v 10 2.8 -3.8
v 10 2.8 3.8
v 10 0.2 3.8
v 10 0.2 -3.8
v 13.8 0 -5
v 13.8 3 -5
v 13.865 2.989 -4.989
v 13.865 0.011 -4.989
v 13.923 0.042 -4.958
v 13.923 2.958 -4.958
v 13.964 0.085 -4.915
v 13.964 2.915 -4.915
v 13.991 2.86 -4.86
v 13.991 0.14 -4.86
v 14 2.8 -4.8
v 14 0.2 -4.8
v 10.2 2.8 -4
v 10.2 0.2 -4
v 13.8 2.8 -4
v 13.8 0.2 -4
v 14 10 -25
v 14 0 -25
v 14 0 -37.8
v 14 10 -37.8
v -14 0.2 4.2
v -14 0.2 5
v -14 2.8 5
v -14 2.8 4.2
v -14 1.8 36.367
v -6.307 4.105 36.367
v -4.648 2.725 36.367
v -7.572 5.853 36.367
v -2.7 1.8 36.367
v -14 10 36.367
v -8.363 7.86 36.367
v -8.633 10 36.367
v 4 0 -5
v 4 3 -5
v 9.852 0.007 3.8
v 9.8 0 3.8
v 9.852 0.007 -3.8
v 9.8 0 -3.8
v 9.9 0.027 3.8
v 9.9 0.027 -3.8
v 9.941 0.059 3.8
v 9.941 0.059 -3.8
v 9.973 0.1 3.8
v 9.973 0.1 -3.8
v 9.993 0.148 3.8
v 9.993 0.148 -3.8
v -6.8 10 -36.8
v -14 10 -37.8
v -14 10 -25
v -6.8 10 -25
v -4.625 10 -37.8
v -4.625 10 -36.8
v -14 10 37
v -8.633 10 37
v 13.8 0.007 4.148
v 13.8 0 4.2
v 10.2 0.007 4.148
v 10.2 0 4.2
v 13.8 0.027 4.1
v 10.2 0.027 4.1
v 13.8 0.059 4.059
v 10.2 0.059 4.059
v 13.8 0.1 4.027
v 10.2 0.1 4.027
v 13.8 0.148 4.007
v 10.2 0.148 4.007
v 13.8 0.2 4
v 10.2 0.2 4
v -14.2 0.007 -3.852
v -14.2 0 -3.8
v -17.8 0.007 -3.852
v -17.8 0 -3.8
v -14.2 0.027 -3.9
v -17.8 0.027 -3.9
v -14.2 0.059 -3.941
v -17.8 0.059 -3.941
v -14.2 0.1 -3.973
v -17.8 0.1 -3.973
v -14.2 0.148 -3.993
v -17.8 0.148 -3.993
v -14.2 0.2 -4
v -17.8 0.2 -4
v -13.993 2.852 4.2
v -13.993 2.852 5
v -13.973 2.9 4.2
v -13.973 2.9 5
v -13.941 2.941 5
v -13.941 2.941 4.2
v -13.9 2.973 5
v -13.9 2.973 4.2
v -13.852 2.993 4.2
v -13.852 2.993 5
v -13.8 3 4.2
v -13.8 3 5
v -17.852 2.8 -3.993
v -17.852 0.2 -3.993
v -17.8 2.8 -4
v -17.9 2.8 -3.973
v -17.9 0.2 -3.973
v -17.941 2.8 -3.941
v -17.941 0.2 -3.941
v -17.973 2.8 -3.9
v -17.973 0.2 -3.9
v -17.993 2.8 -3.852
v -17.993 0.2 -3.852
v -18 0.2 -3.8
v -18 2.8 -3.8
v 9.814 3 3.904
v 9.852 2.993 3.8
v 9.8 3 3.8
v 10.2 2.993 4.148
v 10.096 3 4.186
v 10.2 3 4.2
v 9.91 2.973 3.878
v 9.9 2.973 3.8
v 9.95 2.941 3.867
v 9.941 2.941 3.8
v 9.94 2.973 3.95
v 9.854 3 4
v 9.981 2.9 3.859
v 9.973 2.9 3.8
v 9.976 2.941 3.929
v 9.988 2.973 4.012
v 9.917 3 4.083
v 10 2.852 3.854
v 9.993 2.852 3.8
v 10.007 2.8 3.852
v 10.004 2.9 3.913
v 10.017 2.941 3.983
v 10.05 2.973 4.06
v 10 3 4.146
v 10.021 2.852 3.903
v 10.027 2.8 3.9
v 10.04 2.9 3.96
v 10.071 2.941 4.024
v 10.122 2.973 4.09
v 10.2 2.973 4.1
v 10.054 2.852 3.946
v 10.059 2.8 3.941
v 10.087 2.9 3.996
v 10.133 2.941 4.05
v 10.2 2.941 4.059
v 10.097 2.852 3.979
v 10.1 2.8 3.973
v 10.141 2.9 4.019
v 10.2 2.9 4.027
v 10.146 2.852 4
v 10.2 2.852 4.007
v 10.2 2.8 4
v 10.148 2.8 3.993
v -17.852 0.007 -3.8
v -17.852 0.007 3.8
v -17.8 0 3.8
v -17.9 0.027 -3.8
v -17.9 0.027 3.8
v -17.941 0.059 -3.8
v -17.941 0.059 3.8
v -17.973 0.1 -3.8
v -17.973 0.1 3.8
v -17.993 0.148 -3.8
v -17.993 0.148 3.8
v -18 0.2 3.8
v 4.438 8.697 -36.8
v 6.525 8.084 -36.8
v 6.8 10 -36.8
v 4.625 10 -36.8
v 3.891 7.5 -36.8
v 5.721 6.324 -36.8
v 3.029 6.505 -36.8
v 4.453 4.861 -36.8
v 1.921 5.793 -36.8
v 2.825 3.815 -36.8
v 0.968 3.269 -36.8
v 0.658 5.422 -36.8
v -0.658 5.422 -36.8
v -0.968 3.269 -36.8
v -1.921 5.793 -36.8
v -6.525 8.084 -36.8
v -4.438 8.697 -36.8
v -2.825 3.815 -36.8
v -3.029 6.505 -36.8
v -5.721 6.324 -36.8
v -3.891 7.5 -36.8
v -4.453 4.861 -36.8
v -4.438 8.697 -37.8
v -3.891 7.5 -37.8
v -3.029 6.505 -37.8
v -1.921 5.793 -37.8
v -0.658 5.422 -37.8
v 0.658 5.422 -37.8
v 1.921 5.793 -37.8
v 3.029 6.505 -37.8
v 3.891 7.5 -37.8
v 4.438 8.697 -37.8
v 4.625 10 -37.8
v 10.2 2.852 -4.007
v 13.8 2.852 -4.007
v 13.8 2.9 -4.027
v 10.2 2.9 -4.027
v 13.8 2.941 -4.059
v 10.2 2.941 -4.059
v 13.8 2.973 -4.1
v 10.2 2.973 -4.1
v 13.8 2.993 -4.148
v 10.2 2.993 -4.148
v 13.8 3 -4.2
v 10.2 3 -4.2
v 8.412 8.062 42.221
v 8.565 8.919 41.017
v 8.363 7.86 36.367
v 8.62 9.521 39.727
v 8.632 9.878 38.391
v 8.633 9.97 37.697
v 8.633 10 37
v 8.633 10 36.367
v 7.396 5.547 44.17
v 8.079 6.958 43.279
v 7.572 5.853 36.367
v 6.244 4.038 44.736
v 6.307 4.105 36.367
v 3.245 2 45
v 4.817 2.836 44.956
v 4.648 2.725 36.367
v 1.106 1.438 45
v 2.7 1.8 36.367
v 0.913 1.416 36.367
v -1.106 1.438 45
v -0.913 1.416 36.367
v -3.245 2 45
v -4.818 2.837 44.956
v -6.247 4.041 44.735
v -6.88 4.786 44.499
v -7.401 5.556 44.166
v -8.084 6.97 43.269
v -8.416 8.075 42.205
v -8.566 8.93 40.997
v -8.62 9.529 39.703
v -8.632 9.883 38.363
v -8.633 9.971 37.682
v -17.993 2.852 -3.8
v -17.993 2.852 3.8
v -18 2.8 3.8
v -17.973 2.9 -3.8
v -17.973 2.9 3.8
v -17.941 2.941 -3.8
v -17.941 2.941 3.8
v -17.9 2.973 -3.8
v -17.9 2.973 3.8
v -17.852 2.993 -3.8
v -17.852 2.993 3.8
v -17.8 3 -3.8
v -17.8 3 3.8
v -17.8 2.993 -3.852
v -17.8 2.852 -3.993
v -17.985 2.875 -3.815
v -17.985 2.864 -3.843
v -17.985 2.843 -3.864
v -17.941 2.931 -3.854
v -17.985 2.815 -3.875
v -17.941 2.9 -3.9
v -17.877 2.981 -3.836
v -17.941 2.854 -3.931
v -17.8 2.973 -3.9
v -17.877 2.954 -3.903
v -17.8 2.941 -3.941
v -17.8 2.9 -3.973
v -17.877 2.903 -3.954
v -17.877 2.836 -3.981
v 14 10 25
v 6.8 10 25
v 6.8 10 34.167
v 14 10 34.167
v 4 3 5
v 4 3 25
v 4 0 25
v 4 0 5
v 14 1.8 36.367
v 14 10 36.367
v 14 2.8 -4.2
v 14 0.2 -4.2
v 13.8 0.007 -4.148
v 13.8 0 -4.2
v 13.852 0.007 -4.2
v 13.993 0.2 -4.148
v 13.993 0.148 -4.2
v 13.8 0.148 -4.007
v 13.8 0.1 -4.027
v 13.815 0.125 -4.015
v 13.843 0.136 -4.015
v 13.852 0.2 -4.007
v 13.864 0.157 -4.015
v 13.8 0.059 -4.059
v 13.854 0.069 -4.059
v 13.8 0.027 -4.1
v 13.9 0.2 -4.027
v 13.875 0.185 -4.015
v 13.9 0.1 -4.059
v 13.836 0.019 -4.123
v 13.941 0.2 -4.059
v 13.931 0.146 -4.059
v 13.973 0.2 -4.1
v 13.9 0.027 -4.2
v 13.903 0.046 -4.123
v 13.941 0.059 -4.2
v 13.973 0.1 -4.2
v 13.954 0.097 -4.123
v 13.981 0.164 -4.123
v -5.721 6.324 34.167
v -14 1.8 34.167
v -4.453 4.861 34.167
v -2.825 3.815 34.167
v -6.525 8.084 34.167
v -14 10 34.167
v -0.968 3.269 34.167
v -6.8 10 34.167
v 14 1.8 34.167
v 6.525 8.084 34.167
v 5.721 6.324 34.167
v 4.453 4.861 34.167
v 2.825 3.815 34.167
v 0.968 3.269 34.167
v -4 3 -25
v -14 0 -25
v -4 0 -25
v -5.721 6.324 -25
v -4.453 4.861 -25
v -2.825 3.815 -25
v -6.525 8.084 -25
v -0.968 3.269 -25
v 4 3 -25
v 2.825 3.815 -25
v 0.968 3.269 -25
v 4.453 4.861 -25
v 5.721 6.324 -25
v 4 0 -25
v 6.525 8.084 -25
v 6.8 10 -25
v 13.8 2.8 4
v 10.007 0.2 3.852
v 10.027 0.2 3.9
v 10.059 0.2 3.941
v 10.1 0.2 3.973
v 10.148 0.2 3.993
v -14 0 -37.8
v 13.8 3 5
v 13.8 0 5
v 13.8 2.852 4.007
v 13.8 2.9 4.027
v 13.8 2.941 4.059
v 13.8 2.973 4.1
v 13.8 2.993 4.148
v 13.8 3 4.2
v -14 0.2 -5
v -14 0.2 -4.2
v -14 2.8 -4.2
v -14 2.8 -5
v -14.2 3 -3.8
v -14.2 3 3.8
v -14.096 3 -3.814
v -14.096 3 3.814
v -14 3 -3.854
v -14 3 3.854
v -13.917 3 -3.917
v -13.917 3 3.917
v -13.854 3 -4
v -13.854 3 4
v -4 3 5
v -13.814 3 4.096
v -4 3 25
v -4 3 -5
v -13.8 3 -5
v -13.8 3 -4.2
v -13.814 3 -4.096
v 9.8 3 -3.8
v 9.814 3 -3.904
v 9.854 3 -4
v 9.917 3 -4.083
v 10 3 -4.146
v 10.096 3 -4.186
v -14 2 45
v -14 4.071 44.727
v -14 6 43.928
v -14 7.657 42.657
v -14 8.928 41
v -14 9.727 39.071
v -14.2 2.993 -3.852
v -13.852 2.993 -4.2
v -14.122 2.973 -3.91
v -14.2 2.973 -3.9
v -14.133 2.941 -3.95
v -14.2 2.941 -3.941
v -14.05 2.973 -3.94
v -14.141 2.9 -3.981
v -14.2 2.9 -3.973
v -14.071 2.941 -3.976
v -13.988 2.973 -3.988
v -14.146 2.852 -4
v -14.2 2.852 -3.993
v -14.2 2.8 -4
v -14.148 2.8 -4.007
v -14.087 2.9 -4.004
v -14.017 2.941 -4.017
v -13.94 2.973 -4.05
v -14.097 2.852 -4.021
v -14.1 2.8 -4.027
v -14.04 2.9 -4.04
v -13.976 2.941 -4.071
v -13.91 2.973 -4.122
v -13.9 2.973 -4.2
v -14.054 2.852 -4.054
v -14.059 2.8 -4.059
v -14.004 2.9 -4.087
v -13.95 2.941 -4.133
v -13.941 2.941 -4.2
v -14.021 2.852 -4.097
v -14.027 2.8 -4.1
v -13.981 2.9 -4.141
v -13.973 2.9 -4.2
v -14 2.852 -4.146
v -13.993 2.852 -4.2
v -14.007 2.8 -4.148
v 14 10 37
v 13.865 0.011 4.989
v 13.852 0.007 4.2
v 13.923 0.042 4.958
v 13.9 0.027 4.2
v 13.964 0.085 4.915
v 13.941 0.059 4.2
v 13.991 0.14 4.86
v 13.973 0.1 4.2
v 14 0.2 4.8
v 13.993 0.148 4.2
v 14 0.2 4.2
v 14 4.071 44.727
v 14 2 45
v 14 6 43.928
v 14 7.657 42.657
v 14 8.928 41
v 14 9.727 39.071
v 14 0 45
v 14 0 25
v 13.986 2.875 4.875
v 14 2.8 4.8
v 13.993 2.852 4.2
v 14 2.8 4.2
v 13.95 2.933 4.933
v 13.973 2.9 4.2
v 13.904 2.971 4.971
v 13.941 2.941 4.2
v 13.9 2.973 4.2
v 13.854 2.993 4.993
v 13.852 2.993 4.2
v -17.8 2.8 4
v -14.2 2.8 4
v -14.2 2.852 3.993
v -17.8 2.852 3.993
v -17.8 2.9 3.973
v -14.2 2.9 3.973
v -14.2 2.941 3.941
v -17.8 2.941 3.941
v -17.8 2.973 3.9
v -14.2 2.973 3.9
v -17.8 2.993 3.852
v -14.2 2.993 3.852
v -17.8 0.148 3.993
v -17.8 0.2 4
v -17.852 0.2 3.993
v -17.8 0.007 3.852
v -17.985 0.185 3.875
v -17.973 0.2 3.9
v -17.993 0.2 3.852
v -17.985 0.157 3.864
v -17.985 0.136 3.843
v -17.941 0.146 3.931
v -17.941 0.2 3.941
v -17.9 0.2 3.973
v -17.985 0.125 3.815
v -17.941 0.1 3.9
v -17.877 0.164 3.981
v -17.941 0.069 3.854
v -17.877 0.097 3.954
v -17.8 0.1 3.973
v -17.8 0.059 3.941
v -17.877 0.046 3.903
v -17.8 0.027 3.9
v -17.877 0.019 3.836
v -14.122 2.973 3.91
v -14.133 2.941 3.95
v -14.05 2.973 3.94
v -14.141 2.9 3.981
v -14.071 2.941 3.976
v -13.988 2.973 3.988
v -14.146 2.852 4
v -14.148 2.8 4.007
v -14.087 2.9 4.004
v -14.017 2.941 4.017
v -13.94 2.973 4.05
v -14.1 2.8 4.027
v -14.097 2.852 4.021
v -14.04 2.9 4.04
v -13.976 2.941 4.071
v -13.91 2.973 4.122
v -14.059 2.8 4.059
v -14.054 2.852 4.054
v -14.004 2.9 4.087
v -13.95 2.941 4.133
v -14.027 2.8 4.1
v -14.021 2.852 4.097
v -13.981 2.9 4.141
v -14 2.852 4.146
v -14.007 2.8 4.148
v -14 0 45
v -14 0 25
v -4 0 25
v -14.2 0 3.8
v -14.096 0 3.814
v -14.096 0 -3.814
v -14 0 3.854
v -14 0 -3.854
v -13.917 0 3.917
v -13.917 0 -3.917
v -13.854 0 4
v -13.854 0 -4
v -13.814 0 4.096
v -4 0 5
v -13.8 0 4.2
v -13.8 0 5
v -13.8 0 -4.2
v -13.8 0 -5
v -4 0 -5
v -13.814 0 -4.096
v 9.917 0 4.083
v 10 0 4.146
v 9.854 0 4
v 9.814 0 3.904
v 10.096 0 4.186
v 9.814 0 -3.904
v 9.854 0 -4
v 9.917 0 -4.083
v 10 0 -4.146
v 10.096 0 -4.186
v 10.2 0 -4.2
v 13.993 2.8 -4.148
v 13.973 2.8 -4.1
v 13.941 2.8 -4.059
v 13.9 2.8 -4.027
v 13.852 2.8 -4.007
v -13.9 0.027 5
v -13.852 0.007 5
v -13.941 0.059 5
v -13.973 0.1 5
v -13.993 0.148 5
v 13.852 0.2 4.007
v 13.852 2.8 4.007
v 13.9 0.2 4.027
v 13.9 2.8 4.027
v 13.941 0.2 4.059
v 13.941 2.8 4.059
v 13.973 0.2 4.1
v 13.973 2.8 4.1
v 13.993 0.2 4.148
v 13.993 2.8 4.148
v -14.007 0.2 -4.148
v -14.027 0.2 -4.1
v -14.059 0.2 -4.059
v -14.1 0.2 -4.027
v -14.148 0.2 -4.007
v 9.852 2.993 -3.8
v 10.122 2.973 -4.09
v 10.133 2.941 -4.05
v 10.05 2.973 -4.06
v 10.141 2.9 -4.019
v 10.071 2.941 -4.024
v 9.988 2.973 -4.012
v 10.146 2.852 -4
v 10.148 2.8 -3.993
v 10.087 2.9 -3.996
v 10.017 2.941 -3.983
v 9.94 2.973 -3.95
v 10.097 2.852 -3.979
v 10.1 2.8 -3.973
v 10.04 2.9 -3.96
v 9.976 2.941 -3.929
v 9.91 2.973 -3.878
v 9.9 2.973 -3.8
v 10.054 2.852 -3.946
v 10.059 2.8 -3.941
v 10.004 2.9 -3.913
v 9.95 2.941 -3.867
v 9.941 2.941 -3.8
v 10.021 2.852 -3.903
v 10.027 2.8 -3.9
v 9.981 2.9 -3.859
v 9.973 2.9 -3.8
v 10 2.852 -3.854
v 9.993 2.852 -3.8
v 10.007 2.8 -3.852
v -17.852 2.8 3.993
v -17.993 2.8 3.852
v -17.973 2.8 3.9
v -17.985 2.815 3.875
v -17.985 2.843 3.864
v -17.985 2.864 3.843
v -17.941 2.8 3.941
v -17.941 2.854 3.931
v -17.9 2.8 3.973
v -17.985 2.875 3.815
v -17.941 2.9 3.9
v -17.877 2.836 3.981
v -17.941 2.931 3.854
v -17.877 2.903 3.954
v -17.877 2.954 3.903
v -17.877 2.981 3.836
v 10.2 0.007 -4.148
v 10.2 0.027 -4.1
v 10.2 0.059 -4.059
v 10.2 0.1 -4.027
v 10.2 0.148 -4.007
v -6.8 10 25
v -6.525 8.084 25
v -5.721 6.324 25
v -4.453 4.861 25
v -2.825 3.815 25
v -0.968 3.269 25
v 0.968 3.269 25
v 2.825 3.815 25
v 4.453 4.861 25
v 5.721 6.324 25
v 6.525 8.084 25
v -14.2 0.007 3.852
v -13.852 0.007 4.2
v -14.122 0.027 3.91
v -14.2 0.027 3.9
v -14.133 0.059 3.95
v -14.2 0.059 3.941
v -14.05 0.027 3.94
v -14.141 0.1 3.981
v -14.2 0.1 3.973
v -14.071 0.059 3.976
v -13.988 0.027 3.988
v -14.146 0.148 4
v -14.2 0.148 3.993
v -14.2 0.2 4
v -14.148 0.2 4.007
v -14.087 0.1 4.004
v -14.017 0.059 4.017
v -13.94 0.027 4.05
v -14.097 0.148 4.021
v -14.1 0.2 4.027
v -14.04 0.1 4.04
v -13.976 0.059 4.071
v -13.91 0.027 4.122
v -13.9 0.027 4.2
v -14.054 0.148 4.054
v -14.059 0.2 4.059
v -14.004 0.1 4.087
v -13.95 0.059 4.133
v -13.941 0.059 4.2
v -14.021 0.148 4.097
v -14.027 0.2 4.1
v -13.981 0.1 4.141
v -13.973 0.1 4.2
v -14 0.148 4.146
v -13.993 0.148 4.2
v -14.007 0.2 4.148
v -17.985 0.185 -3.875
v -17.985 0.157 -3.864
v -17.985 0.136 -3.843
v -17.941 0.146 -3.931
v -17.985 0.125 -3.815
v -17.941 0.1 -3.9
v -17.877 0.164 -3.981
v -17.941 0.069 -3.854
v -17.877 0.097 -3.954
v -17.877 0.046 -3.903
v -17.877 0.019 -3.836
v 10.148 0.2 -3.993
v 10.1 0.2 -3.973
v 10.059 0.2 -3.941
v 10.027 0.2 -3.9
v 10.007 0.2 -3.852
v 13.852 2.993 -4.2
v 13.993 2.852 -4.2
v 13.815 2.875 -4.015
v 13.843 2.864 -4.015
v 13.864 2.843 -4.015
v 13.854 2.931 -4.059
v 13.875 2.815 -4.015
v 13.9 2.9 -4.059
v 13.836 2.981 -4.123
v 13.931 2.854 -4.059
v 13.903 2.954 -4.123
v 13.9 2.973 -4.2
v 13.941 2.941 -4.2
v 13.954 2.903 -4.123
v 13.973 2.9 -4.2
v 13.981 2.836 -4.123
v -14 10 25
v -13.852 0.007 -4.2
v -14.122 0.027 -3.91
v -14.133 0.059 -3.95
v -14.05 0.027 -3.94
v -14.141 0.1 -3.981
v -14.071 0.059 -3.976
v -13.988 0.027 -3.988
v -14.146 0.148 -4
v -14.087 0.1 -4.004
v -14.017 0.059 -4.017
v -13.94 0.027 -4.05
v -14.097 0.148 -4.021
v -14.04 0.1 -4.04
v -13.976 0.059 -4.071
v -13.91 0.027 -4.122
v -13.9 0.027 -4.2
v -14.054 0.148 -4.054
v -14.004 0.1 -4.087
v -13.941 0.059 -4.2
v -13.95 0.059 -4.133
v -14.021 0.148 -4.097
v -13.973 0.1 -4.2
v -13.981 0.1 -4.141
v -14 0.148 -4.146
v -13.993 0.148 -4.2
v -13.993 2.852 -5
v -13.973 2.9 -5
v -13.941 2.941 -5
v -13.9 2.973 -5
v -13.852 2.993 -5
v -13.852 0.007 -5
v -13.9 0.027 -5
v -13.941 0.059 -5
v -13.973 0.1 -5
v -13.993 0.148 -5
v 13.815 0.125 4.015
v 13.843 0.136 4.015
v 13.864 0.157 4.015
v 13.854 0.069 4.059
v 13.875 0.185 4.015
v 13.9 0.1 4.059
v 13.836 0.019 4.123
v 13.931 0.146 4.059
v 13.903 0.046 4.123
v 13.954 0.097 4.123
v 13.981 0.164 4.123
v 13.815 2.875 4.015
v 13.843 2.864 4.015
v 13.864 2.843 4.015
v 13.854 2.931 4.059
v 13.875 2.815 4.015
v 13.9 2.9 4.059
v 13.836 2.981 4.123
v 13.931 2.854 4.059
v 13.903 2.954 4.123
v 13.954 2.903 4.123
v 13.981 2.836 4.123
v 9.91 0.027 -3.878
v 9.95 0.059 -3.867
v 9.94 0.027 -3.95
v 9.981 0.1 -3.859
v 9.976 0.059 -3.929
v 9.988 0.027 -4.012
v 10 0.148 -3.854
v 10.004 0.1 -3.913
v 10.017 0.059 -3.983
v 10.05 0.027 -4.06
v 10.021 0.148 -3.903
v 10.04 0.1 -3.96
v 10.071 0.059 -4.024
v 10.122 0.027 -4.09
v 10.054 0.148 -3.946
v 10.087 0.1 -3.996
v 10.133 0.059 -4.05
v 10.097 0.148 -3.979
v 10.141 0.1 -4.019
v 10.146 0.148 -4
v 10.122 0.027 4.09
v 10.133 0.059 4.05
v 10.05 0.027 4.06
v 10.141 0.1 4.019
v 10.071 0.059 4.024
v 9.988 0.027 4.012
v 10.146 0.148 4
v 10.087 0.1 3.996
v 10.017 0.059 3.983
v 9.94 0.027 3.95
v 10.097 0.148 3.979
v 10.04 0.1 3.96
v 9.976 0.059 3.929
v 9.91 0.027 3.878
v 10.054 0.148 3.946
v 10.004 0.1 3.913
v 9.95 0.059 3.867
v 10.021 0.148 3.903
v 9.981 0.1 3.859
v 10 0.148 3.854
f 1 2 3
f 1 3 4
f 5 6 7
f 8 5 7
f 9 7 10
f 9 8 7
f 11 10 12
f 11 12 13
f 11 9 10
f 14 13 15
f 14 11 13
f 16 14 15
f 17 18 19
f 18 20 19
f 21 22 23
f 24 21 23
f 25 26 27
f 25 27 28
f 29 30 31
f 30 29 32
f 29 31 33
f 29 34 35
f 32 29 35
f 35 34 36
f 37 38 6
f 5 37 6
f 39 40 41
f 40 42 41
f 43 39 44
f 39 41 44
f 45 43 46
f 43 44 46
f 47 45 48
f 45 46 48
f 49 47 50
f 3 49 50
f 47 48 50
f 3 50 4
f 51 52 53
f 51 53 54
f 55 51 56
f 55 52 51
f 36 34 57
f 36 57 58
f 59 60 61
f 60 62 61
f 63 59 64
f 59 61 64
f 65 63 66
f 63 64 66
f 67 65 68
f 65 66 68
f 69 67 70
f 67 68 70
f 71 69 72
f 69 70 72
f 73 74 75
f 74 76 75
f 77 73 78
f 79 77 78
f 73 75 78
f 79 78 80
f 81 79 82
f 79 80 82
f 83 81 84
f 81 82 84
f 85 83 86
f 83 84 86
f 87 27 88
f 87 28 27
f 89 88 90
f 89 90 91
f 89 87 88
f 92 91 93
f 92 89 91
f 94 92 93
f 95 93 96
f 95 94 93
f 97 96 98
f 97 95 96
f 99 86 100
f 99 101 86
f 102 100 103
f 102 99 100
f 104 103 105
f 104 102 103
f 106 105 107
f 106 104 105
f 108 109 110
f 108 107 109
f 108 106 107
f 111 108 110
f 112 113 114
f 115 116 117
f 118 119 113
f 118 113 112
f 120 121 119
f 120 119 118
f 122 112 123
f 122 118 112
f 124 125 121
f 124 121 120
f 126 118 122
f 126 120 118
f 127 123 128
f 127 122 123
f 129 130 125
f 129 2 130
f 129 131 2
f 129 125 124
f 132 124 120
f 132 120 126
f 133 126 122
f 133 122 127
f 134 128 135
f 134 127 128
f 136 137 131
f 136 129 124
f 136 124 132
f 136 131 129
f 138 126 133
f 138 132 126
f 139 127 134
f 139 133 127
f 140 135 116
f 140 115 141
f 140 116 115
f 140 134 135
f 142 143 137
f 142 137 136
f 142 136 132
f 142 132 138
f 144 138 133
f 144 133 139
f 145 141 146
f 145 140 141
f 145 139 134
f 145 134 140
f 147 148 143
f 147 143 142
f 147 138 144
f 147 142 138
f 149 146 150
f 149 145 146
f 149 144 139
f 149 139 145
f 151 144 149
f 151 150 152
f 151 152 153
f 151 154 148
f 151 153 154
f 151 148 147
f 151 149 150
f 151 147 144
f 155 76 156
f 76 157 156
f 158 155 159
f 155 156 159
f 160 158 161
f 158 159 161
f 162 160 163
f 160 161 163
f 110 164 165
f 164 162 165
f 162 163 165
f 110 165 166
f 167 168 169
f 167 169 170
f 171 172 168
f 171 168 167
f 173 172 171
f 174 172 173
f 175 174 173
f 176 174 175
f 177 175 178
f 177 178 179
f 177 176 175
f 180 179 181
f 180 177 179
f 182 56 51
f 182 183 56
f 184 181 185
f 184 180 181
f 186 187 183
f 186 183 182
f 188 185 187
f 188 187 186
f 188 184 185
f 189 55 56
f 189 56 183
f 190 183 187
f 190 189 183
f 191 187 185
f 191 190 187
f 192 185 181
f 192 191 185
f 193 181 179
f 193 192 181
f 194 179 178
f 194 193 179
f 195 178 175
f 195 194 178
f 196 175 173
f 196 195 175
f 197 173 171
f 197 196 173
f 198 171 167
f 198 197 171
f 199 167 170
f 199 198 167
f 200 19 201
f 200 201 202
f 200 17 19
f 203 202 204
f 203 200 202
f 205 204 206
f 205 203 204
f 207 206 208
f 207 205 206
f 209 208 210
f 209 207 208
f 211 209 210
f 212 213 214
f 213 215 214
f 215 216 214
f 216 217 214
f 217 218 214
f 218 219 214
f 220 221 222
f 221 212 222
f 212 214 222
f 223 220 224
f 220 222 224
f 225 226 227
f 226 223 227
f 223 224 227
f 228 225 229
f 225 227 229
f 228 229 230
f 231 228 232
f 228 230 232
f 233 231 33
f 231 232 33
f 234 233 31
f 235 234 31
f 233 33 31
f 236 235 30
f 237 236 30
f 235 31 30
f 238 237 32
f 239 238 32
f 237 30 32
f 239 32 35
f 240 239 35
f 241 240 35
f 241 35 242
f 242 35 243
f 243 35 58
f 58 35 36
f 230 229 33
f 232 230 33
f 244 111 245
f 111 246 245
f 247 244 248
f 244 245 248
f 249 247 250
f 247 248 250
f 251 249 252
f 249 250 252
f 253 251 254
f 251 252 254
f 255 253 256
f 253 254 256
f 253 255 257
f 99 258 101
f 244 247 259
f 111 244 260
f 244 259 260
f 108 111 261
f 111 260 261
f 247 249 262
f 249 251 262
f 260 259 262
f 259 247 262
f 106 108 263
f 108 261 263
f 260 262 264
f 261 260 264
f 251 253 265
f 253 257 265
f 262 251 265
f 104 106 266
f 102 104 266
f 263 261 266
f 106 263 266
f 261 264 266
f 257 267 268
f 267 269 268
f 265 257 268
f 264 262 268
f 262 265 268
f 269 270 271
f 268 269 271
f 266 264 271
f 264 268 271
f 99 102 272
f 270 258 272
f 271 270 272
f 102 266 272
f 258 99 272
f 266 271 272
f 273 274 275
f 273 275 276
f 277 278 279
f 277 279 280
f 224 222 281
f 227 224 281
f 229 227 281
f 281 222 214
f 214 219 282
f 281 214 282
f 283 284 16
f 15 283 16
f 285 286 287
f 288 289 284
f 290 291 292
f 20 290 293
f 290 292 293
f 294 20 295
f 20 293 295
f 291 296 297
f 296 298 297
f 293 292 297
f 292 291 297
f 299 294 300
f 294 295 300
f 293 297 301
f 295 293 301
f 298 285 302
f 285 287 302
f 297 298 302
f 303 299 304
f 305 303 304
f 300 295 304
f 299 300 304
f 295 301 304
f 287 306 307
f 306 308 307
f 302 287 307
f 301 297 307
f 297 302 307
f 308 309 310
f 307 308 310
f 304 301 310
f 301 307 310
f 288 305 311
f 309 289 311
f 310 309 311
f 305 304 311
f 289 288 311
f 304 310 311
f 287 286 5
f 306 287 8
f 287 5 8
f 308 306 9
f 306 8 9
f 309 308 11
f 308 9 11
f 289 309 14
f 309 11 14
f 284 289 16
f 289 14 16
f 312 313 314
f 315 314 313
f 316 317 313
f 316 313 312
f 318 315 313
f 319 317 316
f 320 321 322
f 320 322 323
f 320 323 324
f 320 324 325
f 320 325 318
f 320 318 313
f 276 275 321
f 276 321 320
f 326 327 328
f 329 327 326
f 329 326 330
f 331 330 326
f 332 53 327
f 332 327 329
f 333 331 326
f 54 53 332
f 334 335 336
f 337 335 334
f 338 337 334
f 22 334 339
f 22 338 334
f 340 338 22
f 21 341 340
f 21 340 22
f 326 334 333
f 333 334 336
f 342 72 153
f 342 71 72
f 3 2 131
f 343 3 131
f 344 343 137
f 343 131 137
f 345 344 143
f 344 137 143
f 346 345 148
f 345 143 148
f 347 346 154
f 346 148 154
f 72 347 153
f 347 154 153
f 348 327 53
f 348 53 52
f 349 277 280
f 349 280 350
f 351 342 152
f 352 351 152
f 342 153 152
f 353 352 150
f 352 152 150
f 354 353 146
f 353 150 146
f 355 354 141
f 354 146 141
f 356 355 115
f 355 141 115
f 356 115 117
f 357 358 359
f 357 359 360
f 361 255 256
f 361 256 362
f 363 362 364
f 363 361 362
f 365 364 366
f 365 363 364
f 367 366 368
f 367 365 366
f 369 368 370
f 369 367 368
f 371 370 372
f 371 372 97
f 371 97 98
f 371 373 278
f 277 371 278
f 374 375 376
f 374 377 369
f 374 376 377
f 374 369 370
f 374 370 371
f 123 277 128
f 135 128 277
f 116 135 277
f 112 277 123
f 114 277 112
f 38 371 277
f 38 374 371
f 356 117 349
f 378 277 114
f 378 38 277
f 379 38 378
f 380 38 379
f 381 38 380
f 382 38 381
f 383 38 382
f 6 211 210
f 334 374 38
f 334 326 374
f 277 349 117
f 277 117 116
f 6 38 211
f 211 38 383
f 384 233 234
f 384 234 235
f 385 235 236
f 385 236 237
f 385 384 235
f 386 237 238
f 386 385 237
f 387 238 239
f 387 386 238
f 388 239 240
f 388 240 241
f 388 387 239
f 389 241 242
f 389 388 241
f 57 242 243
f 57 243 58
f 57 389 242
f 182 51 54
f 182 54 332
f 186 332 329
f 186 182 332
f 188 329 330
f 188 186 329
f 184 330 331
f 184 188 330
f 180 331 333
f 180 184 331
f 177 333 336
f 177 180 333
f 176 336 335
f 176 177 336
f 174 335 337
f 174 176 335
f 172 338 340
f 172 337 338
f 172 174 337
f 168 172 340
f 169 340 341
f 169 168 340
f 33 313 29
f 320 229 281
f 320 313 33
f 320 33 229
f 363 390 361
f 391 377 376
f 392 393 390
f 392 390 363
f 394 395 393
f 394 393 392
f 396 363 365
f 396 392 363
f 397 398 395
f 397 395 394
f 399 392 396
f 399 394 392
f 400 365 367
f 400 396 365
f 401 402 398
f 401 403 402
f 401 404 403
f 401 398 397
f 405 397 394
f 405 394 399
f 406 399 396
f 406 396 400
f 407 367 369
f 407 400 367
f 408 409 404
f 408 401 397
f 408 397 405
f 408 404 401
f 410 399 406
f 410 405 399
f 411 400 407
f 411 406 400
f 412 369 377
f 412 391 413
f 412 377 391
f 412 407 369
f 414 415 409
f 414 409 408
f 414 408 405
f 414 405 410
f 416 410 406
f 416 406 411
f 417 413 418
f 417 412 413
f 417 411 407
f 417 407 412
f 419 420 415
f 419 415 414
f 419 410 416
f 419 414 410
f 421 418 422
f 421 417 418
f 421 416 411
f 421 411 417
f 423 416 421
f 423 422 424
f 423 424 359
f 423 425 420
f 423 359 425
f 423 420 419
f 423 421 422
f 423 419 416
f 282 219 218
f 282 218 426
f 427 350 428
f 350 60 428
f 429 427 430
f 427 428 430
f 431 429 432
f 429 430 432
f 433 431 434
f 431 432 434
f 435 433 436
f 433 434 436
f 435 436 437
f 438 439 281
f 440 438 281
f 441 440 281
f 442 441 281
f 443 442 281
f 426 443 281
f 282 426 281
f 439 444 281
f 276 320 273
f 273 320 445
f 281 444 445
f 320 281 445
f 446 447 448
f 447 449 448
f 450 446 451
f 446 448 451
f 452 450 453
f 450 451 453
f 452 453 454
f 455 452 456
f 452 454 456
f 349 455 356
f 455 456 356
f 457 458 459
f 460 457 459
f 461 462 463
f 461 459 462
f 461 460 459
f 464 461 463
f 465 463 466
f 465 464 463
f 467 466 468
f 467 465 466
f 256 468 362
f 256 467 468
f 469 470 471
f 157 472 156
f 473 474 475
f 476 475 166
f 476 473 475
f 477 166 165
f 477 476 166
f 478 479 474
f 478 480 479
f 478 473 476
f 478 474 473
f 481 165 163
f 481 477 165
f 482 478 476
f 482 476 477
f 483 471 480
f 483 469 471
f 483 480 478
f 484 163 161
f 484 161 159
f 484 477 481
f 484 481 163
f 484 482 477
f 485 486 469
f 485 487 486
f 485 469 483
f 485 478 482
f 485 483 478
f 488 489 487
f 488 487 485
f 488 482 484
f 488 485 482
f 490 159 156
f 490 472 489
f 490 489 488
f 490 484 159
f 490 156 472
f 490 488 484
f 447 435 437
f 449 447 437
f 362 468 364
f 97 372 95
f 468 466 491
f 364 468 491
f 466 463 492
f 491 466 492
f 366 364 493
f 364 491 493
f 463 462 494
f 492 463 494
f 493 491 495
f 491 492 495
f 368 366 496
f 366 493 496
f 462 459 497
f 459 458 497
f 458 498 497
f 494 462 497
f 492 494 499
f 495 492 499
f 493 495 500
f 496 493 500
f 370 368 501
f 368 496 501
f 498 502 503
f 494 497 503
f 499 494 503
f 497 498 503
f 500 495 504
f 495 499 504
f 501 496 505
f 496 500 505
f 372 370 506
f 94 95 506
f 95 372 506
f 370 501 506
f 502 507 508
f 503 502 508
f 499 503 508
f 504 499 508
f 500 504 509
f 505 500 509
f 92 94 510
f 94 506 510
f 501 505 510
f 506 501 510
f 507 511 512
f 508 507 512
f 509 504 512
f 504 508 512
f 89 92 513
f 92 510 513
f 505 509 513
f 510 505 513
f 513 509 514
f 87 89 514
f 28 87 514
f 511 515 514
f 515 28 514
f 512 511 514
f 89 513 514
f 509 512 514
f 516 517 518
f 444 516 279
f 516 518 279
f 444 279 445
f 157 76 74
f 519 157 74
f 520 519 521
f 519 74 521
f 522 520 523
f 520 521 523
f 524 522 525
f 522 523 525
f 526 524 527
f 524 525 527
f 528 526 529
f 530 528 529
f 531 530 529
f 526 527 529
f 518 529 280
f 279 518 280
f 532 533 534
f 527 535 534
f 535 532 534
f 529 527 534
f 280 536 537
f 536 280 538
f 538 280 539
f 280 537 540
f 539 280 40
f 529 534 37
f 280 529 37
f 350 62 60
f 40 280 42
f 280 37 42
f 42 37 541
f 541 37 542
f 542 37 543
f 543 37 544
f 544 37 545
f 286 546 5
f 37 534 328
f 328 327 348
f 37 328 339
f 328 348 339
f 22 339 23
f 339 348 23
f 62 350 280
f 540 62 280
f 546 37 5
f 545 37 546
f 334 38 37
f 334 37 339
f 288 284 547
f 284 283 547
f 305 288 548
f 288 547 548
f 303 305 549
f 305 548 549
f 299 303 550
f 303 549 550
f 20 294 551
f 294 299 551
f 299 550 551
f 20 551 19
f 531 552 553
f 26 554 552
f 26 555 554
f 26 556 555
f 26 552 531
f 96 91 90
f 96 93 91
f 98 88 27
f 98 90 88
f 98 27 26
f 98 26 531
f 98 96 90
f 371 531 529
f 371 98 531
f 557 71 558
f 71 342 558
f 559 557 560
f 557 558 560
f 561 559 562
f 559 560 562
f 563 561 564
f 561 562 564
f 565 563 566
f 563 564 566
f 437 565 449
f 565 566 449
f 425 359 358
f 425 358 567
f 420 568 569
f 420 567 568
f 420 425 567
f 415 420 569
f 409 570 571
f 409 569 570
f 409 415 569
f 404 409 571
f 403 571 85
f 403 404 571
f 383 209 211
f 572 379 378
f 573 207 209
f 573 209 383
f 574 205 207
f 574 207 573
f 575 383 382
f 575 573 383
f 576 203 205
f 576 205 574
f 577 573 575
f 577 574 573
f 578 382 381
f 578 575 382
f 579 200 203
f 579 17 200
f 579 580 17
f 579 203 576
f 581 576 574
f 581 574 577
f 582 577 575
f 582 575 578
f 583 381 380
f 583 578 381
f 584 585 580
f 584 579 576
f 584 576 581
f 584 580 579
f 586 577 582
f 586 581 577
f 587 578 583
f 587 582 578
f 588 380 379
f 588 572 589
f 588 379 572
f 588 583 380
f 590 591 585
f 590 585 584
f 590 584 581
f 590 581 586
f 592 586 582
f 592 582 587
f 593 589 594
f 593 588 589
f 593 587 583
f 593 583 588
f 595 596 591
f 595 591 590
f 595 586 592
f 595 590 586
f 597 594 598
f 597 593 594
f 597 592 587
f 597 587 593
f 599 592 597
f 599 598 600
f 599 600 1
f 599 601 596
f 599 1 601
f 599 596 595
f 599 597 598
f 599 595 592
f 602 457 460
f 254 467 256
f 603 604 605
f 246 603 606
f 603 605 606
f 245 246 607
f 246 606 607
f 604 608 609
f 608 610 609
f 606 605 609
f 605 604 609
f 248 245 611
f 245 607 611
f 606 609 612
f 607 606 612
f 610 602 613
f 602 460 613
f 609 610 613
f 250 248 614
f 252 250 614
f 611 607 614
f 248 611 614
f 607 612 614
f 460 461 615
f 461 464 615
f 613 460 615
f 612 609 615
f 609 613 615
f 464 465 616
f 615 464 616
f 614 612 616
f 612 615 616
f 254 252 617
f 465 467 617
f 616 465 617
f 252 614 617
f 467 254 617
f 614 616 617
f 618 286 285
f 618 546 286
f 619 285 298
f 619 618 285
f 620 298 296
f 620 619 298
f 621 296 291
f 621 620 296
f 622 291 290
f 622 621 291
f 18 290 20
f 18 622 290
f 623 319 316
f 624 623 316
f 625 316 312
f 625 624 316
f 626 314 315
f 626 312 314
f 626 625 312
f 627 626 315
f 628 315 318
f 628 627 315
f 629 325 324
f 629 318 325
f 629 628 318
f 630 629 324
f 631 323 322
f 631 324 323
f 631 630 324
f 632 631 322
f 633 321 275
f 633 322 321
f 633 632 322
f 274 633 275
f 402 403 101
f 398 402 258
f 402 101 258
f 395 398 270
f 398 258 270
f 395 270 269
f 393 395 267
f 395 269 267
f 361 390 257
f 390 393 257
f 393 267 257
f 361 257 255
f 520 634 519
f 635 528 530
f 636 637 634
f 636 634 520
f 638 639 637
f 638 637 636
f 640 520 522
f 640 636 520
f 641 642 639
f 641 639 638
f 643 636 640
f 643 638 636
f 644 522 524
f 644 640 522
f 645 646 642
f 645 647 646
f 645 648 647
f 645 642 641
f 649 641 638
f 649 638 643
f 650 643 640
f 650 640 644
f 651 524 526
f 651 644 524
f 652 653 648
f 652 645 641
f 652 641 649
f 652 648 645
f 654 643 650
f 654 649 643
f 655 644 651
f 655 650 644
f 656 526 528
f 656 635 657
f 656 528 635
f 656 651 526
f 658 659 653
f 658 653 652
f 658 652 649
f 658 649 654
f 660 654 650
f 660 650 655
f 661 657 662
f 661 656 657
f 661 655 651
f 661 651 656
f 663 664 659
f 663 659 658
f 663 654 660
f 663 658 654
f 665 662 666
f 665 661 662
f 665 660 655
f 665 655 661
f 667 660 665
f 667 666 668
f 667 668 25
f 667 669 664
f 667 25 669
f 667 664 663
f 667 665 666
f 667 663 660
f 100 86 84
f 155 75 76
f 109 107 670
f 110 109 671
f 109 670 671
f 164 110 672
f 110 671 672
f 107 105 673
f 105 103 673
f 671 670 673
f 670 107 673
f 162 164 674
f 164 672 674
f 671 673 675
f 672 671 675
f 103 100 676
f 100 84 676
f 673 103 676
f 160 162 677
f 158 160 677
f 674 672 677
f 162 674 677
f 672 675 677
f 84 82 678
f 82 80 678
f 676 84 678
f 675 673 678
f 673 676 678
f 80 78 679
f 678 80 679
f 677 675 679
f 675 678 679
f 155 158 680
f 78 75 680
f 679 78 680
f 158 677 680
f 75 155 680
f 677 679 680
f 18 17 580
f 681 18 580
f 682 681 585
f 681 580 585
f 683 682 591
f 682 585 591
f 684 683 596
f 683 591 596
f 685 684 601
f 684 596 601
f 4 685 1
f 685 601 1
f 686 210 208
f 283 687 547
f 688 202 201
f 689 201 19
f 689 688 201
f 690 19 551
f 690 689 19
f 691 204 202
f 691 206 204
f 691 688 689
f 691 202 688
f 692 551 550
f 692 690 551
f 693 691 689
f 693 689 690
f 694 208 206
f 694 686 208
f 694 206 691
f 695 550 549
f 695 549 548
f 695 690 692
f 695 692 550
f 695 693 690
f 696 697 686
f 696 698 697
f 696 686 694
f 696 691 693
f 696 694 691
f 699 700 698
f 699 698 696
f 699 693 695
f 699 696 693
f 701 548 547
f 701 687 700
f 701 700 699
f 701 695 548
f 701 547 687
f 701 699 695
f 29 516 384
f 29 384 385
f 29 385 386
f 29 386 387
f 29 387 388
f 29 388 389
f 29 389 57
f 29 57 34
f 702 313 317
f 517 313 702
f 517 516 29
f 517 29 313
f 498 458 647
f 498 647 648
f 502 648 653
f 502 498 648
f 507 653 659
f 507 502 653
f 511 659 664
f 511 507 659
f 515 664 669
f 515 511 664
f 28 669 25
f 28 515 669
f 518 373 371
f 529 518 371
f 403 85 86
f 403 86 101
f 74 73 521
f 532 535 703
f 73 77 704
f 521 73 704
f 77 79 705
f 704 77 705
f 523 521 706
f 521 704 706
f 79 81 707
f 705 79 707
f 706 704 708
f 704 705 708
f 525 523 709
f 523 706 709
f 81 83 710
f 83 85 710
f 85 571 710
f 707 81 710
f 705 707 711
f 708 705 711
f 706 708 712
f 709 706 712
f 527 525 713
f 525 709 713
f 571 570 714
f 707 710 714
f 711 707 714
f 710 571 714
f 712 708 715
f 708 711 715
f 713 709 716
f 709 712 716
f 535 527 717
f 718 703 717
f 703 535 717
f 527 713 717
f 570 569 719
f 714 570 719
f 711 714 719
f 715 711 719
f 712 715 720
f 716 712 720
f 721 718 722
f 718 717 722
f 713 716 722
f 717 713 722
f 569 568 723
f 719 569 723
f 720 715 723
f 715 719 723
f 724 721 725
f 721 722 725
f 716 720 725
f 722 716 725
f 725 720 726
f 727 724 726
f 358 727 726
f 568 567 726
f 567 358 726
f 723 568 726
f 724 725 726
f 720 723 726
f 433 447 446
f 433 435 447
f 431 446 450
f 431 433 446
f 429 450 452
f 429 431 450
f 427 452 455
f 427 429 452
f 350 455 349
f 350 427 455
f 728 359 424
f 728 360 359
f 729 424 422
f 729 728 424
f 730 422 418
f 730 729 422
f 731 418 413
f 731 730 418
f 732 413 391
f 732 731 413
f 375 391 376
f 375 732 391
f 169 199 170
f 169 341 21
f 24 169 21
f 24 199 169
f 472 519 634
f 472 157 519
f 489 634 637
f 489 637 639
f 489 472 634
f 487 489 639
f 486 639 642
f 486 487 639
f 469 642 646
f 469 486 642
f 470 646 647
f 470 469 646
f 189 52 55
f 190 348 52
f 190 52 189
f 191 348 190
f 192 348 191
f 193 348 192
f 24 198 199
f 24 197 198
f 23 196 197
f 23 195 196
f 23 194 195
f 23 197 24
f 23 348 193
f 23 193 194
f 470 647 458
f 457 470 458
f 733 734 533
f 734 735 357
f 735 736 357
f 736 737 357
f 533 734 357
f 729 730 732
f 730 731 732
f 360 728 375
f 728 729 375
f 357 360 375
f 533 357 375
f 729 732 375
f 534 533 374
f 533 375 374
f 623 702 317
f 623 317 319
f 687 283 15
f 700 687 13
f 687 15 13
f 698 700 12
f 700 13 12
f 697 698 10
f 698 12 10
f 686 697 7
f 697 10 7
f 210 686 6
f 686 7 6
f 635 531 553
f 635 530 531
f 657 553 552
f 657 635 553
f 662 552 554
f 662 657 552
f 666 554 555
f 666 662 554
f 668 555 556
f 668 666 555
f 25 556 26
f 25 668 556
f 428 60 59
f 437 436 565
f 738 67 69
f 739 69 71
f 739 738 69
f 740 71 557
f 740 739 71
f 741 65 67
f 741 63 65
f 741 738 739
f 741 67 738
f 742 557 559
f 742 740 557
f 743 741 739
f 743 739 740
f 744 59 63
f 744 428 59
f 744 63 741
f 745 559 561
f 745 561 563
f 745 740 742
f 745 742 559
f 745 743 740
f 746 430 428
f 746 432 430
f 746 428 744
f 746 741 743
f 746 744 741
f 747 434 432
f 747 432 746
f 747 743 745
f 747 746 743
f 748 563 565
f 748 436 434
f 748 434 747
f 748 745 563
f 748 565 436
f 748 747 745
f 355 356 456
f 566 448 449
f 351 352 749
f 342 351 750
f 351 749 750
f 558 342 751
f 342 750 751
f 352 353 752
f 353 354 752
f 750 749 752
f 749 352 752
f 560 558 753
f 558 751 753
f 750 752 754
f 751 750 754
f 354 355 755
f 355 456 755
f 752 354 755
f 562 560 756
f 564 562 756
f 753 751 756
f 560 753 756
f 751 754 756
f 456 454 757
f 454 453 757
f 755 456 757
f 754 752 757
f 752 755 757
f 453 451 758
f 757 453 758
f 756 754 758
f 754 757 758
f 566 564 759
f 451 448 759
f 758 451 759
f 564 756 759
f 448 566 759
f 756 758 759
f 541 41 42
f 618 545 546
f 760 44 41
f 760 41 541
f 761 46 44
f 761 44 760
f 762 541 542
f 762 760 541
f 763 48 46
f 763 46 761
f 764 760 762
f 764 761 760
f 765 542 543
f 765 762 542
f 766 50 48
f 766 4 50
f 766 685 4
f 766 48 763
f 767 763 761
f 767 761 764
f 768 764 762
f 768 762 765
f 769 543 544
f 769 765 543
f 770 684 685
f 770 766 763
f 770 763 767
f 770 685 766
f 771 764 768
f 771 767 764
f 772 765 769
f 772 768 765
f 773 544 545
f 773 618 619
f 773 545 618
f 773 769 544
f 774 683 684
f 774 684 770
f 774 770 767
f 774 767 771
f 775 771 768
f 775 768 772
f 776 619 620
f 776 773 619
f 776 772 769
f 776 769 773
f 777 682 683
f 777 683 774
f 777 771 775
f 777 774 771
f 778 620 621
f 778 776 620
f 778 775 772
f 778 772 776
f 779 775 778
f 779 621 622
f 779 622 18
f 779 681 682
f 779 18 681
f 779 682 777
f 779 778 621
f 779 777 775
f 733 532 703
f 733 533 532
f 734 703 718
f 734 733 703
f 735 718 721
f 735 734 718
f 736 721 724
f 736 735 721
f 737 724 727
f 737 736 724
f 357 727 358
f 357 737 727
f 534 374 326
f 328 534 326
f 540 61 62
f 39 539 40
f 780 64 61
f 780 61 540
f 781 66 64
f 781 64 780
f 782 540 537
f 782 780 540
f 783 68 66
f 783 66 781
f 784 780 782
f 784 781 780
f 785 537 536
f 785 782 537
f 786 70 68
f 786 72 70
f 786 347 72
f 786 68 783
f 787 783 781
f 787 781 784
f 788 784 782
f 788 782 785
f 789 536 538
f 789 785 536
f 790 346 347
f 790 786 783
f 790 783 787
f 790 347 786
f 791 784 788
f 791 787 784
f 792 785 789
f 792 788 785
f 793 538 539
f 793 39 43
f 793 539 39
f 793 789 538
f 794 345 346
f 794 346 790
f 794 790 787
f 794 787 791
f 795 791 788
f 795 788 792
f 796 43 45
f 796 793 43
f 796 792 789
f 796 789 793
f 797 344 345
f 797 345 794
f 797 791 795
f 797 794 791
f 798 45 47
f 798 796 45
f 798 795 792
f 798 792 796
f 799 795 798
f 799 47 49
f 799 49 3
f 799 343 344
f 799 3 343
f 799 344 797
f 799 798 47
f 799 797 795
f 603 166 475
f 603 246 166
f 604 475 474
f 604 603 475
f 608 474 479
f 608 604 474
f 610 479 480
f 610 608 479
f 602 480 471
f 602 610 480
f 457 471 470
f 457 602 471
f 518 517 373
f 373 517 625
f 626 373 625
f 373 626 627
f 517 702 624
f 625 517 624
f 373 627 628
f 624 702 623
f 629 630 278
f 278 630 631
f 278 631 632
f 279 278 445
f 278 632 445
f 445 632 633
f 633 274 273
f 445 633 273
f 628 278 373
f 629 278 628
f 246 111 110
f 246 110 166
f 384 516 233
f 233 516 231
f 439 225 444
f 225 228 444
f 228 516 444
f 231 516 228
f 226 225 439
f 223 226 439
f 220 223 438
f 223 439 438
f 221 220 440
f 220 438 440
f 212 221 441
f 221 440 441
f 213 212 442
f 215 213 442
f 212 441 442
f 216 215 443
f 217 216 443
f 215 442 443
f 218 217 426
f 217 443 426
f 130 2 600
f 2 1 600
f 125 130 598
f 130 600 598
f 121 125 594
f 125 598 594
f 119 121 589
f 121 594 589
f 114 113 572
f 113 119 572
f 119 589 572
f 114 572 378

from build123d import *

# Parameters (mm, degrees)
SKETCH1_W                   = 28
SKETCH1_H                   = 90
BOSS_EXTRUDE1_DEPTH         = 10
SKETCH4_W                   = 6.8
SKETCH4_H                   = 71
SKETCH5_W                   = 28
SKETCH5_H                   = 2.2
FLANGE_SLOT_DEPTH           = 8.2
SKETCH6_W                   = 8.632931683
SKETCH6_H                   = 8.632931683
SKETCH3_W                   = 4.625
SKETCH3_H                   = 10.2
CUT_EXTRUDE4_DEPTH          = 49.176757882
CUT_EXTRUDE4_DEPTH_BACK     = 49.176757882
SKETCH17_W                  = 38.089842412
SKETCH17_H                  = 14.4
SKETCH18_W                  = 28
SKETCH18_H                  = 50
SYRINGE_BAY_DEPTH           = 7
SYRINGE_PLUNGER_LEFT_R      = 8
SYRINGE_START               = -15
SYRINGE_PLUNGER_RIGHT_DEPTH = 23.632931783
SKETCH19_W                  = 10
SKETCH19_H                  = 20
CUT_EXTRUDE5_DEPTH          = 10
SKETCH24_W                  = 8
SKETCH24_H                  = 3
BOSS_EXTRUDE3_DEPTH         = 4
SKETCH25_W                  = 8
SKETCH25_H                  = 3
CUT_EXTRUDE6_DEPTH          = 4
FILLET1_R                   = 0.2
FILLET2_R                   = 0.2


with BuildPart() as part:
    # Sketch1 → Boss-Extrude1 (new body)
    with BuildSketch(Plane(origin=(0, 0, 0), x_dir=(1, 0, 0), z_dir=(0, 1, 0))):
        Rectangle(SKETCH1_W, SKETCH1_H)
    extrude(amount=BOSS_EXTRUDE1_DEPTH)

    # Sketch4 → Syringe Body slot (revolve, cut)
    with BuildSketch(Plane(origin=(0, 10, 0), x_dir=(1, 0, 0), z_dir=(0, 1, 0))):
        with Locations((-3.4, 1.3)):
            Rectangle(SKETCH4_W, SKETCH4_H)
    revolve(axis=Axis((0, 10, -36.8), (0, 0, 1)), mode=Mode.SUBTRACT)

    # Sketch5 → Flange Slot (cut)
    with BuildSketch(Plane(origin=(0, 10, 0), x_dir=(1, 0, 0), z_dir=(0, 1, 0))):
        with Locations((0, -35.267068317)):
            Rectangle(SKETCH5_W, SKETCH5_H)
    extrude(amount=-FLANGE_SLOT_DEPTH, mode=Mode.SUBTRACT)

    # Sketch6 → Plunger Slot (revolve, cut)
    with BuildSketch(Plane(origin=(0, 10, 0), x_dir=(1, 0, 0), z_dir=(0, 1, 0))):
        with Locations((-4.316465842, -40.683534159)):
            Rectangle(SKETCH6_W, SKETCH6_H)
    revolve(axis=Axis((0, 10, 45), (0, 0, -1)), mode=Mode.SUBTRACT)

    # Sketch3 → Barrell Slot (revolve, cut)
    with BuildSketch(Plane(origin=(0, 10, 0), x_dir=(1, 0, 0), z_dir=(0, 1, 0))):
        with Locations((-2.3125, 39.9)):
            Rectangle(SKETCH3_W, SKETCH3_H)
    revolve(axis=Axis((0, 10, -45), (0, 0, 1)), mode=Mode.SUBTRACT)

    # Sketch17 → Cut-Extrude4 (cut, two sides: drawn at the far end of the back side and taken through both)
    with BuildSketch(Plane(origin=(0, 10, 0), x_dir=(1, 0, 0), z_dir=(0, 1, 0)).offset(-CUT_EXTRUDE4_DEPTH_BACK)):
        with Locations((0, 45)):
            Rectangle(SKETCH17_W, SKETCH17_H)
    extrude(amount=CUT_EXTRUDE4_DEPTH + CUT_EXTRUDE4_DEPTH_BACK, mode=Mode.SUBTRACT)

    # Sketch18 → Syringe Bay (cut)
    with BuildSketch(Plane(origin=(0, 10, 0), x_dir=(1, 0, 0), z_dir=(0, 1, 0))):
        Rectangle(SKETCH18_W, SKETCH18_H)
    extrude(amount=-SYRINGE_BAY_DEPTH, mode=Mode.SUBTRACT)

    # Syringe plunger left
    syringe_plunger_left_edges = [part.edges().sort_by_distance(p)[0] for p in [
        (11.316465842, 10, 45),
    ]]
    fillet(syringe_plunger_left_edges, radius=SYRINGE_PLUNGER_LEFT_R)

    # Syringe plunger right: read off the stored shape, not the designer's step
    # Syringe plunger right outline → Syringe plunger right (cut)
    with BuildSketch(Plane.YZ.offset(SYRINGE_START)):
        with BuildLine():
            ThreePointArc((2, 45), (7.656854249, 42.656854249), (10, 37))
            Line((10, 37), (10, 45))
            Line((10, 45), (2, 45))
        make_face()
    extrude(amount=SYRINGE_PLUNGER_RIGHT_DEPTH, mode=Mode.SUBTRACT)

    # Sketch19 → Cut-Extrude5 (cut)
    with BuildSketch(Plane(origin=(0, 3, 0), x_dir=(1, 0, 0), z_dir=(0, 1, 0))):
        with Locations((-9, 15)):
            Rectangle(SKETCH19_W, SKETCH19_H)
        with Locations((-9, -15)):
            Rectangle(SKETCH19_W, SKETCH19_H)
        with Locations((9, -15)):
            Rectangle(SKETCH19_W, SKETCH19_H)
        with Locations((9, 15)):
            Rectangle(SKETCH19_W, SKETCH19_H)
    extrude(amount=-CUT_EXTRUDE5_DEPTH, mode=Mode.SUBTRACT)

    # Sketch24 → Boss-Extrude3 (add)
    with BuildSketch(Plane.ZY.offset(14)):
        with Locations((0, 1.5)):
            Rectangle(SKETCH24_W, SKETCH24_H)
    extrude(amount=BOSS_EXTRUDE3_DEPTH)

    # Sketch25 → Cut-Extrude6 (cut)
    with BuildSketch(Plane(origin=(14, 0, 0), x_dir=(0, 0, -1), z_dir=(1, 0, 0))):
        with Locations((0, 1.5)):
            Rectangle(SKETCH25_W, SKETCH25_H)
    extrude(amount=-CUT_EXTRUDE6_DEPTH, mode=Mode.SUBTRACT)

    # Fillet1
    fillet1_edges = [part.edges().sort_by_distance(p)[0] for p in [
        (14, 0, 4.5),
        (14, 3, 4.5),
        (14, 1.5, -5),
        (14, 1.5, 5),
        (14, 0, -4.5),
        (14, 3, -4.5),
        (10, 1.5, -4),
        (12, 3, -4),
        (10, 0, 0),
        (12, 0, -4),
        (10, 1.5, 4),
        (12, 0, 4),
        (10, 3, 0),
        (12, 3, 4),
        (14, 1.5, -4),
        (14, 1.5, 4),
    ]]
    fillet(fillet1_edges, radius=FILLET1_R)

    # Fillet2
    fillet2_edges = [part.edges().sort_by_distance(p)[0] for p in [
        (-14, 0, -4.5),
        (-14, 3, -4.5),
        (-14, 3, 4.5),
        (-14, 0, 4.5),
        (-14, 1.5, 4),
        (-16, 0, 4),
        (-16, 3, 4),
        (-14, 1.5, -4),
        (-16, 3, -4),
        (-16, 0, -4),
        (-18, 1.5, 4),
        (-18, 3, 0),
        (-18, 1.5, -4),
        (-18, 0, 0),
    ]]
    fillet(fillet2_edges, radius=FILLET2_R)


solid = part.part
